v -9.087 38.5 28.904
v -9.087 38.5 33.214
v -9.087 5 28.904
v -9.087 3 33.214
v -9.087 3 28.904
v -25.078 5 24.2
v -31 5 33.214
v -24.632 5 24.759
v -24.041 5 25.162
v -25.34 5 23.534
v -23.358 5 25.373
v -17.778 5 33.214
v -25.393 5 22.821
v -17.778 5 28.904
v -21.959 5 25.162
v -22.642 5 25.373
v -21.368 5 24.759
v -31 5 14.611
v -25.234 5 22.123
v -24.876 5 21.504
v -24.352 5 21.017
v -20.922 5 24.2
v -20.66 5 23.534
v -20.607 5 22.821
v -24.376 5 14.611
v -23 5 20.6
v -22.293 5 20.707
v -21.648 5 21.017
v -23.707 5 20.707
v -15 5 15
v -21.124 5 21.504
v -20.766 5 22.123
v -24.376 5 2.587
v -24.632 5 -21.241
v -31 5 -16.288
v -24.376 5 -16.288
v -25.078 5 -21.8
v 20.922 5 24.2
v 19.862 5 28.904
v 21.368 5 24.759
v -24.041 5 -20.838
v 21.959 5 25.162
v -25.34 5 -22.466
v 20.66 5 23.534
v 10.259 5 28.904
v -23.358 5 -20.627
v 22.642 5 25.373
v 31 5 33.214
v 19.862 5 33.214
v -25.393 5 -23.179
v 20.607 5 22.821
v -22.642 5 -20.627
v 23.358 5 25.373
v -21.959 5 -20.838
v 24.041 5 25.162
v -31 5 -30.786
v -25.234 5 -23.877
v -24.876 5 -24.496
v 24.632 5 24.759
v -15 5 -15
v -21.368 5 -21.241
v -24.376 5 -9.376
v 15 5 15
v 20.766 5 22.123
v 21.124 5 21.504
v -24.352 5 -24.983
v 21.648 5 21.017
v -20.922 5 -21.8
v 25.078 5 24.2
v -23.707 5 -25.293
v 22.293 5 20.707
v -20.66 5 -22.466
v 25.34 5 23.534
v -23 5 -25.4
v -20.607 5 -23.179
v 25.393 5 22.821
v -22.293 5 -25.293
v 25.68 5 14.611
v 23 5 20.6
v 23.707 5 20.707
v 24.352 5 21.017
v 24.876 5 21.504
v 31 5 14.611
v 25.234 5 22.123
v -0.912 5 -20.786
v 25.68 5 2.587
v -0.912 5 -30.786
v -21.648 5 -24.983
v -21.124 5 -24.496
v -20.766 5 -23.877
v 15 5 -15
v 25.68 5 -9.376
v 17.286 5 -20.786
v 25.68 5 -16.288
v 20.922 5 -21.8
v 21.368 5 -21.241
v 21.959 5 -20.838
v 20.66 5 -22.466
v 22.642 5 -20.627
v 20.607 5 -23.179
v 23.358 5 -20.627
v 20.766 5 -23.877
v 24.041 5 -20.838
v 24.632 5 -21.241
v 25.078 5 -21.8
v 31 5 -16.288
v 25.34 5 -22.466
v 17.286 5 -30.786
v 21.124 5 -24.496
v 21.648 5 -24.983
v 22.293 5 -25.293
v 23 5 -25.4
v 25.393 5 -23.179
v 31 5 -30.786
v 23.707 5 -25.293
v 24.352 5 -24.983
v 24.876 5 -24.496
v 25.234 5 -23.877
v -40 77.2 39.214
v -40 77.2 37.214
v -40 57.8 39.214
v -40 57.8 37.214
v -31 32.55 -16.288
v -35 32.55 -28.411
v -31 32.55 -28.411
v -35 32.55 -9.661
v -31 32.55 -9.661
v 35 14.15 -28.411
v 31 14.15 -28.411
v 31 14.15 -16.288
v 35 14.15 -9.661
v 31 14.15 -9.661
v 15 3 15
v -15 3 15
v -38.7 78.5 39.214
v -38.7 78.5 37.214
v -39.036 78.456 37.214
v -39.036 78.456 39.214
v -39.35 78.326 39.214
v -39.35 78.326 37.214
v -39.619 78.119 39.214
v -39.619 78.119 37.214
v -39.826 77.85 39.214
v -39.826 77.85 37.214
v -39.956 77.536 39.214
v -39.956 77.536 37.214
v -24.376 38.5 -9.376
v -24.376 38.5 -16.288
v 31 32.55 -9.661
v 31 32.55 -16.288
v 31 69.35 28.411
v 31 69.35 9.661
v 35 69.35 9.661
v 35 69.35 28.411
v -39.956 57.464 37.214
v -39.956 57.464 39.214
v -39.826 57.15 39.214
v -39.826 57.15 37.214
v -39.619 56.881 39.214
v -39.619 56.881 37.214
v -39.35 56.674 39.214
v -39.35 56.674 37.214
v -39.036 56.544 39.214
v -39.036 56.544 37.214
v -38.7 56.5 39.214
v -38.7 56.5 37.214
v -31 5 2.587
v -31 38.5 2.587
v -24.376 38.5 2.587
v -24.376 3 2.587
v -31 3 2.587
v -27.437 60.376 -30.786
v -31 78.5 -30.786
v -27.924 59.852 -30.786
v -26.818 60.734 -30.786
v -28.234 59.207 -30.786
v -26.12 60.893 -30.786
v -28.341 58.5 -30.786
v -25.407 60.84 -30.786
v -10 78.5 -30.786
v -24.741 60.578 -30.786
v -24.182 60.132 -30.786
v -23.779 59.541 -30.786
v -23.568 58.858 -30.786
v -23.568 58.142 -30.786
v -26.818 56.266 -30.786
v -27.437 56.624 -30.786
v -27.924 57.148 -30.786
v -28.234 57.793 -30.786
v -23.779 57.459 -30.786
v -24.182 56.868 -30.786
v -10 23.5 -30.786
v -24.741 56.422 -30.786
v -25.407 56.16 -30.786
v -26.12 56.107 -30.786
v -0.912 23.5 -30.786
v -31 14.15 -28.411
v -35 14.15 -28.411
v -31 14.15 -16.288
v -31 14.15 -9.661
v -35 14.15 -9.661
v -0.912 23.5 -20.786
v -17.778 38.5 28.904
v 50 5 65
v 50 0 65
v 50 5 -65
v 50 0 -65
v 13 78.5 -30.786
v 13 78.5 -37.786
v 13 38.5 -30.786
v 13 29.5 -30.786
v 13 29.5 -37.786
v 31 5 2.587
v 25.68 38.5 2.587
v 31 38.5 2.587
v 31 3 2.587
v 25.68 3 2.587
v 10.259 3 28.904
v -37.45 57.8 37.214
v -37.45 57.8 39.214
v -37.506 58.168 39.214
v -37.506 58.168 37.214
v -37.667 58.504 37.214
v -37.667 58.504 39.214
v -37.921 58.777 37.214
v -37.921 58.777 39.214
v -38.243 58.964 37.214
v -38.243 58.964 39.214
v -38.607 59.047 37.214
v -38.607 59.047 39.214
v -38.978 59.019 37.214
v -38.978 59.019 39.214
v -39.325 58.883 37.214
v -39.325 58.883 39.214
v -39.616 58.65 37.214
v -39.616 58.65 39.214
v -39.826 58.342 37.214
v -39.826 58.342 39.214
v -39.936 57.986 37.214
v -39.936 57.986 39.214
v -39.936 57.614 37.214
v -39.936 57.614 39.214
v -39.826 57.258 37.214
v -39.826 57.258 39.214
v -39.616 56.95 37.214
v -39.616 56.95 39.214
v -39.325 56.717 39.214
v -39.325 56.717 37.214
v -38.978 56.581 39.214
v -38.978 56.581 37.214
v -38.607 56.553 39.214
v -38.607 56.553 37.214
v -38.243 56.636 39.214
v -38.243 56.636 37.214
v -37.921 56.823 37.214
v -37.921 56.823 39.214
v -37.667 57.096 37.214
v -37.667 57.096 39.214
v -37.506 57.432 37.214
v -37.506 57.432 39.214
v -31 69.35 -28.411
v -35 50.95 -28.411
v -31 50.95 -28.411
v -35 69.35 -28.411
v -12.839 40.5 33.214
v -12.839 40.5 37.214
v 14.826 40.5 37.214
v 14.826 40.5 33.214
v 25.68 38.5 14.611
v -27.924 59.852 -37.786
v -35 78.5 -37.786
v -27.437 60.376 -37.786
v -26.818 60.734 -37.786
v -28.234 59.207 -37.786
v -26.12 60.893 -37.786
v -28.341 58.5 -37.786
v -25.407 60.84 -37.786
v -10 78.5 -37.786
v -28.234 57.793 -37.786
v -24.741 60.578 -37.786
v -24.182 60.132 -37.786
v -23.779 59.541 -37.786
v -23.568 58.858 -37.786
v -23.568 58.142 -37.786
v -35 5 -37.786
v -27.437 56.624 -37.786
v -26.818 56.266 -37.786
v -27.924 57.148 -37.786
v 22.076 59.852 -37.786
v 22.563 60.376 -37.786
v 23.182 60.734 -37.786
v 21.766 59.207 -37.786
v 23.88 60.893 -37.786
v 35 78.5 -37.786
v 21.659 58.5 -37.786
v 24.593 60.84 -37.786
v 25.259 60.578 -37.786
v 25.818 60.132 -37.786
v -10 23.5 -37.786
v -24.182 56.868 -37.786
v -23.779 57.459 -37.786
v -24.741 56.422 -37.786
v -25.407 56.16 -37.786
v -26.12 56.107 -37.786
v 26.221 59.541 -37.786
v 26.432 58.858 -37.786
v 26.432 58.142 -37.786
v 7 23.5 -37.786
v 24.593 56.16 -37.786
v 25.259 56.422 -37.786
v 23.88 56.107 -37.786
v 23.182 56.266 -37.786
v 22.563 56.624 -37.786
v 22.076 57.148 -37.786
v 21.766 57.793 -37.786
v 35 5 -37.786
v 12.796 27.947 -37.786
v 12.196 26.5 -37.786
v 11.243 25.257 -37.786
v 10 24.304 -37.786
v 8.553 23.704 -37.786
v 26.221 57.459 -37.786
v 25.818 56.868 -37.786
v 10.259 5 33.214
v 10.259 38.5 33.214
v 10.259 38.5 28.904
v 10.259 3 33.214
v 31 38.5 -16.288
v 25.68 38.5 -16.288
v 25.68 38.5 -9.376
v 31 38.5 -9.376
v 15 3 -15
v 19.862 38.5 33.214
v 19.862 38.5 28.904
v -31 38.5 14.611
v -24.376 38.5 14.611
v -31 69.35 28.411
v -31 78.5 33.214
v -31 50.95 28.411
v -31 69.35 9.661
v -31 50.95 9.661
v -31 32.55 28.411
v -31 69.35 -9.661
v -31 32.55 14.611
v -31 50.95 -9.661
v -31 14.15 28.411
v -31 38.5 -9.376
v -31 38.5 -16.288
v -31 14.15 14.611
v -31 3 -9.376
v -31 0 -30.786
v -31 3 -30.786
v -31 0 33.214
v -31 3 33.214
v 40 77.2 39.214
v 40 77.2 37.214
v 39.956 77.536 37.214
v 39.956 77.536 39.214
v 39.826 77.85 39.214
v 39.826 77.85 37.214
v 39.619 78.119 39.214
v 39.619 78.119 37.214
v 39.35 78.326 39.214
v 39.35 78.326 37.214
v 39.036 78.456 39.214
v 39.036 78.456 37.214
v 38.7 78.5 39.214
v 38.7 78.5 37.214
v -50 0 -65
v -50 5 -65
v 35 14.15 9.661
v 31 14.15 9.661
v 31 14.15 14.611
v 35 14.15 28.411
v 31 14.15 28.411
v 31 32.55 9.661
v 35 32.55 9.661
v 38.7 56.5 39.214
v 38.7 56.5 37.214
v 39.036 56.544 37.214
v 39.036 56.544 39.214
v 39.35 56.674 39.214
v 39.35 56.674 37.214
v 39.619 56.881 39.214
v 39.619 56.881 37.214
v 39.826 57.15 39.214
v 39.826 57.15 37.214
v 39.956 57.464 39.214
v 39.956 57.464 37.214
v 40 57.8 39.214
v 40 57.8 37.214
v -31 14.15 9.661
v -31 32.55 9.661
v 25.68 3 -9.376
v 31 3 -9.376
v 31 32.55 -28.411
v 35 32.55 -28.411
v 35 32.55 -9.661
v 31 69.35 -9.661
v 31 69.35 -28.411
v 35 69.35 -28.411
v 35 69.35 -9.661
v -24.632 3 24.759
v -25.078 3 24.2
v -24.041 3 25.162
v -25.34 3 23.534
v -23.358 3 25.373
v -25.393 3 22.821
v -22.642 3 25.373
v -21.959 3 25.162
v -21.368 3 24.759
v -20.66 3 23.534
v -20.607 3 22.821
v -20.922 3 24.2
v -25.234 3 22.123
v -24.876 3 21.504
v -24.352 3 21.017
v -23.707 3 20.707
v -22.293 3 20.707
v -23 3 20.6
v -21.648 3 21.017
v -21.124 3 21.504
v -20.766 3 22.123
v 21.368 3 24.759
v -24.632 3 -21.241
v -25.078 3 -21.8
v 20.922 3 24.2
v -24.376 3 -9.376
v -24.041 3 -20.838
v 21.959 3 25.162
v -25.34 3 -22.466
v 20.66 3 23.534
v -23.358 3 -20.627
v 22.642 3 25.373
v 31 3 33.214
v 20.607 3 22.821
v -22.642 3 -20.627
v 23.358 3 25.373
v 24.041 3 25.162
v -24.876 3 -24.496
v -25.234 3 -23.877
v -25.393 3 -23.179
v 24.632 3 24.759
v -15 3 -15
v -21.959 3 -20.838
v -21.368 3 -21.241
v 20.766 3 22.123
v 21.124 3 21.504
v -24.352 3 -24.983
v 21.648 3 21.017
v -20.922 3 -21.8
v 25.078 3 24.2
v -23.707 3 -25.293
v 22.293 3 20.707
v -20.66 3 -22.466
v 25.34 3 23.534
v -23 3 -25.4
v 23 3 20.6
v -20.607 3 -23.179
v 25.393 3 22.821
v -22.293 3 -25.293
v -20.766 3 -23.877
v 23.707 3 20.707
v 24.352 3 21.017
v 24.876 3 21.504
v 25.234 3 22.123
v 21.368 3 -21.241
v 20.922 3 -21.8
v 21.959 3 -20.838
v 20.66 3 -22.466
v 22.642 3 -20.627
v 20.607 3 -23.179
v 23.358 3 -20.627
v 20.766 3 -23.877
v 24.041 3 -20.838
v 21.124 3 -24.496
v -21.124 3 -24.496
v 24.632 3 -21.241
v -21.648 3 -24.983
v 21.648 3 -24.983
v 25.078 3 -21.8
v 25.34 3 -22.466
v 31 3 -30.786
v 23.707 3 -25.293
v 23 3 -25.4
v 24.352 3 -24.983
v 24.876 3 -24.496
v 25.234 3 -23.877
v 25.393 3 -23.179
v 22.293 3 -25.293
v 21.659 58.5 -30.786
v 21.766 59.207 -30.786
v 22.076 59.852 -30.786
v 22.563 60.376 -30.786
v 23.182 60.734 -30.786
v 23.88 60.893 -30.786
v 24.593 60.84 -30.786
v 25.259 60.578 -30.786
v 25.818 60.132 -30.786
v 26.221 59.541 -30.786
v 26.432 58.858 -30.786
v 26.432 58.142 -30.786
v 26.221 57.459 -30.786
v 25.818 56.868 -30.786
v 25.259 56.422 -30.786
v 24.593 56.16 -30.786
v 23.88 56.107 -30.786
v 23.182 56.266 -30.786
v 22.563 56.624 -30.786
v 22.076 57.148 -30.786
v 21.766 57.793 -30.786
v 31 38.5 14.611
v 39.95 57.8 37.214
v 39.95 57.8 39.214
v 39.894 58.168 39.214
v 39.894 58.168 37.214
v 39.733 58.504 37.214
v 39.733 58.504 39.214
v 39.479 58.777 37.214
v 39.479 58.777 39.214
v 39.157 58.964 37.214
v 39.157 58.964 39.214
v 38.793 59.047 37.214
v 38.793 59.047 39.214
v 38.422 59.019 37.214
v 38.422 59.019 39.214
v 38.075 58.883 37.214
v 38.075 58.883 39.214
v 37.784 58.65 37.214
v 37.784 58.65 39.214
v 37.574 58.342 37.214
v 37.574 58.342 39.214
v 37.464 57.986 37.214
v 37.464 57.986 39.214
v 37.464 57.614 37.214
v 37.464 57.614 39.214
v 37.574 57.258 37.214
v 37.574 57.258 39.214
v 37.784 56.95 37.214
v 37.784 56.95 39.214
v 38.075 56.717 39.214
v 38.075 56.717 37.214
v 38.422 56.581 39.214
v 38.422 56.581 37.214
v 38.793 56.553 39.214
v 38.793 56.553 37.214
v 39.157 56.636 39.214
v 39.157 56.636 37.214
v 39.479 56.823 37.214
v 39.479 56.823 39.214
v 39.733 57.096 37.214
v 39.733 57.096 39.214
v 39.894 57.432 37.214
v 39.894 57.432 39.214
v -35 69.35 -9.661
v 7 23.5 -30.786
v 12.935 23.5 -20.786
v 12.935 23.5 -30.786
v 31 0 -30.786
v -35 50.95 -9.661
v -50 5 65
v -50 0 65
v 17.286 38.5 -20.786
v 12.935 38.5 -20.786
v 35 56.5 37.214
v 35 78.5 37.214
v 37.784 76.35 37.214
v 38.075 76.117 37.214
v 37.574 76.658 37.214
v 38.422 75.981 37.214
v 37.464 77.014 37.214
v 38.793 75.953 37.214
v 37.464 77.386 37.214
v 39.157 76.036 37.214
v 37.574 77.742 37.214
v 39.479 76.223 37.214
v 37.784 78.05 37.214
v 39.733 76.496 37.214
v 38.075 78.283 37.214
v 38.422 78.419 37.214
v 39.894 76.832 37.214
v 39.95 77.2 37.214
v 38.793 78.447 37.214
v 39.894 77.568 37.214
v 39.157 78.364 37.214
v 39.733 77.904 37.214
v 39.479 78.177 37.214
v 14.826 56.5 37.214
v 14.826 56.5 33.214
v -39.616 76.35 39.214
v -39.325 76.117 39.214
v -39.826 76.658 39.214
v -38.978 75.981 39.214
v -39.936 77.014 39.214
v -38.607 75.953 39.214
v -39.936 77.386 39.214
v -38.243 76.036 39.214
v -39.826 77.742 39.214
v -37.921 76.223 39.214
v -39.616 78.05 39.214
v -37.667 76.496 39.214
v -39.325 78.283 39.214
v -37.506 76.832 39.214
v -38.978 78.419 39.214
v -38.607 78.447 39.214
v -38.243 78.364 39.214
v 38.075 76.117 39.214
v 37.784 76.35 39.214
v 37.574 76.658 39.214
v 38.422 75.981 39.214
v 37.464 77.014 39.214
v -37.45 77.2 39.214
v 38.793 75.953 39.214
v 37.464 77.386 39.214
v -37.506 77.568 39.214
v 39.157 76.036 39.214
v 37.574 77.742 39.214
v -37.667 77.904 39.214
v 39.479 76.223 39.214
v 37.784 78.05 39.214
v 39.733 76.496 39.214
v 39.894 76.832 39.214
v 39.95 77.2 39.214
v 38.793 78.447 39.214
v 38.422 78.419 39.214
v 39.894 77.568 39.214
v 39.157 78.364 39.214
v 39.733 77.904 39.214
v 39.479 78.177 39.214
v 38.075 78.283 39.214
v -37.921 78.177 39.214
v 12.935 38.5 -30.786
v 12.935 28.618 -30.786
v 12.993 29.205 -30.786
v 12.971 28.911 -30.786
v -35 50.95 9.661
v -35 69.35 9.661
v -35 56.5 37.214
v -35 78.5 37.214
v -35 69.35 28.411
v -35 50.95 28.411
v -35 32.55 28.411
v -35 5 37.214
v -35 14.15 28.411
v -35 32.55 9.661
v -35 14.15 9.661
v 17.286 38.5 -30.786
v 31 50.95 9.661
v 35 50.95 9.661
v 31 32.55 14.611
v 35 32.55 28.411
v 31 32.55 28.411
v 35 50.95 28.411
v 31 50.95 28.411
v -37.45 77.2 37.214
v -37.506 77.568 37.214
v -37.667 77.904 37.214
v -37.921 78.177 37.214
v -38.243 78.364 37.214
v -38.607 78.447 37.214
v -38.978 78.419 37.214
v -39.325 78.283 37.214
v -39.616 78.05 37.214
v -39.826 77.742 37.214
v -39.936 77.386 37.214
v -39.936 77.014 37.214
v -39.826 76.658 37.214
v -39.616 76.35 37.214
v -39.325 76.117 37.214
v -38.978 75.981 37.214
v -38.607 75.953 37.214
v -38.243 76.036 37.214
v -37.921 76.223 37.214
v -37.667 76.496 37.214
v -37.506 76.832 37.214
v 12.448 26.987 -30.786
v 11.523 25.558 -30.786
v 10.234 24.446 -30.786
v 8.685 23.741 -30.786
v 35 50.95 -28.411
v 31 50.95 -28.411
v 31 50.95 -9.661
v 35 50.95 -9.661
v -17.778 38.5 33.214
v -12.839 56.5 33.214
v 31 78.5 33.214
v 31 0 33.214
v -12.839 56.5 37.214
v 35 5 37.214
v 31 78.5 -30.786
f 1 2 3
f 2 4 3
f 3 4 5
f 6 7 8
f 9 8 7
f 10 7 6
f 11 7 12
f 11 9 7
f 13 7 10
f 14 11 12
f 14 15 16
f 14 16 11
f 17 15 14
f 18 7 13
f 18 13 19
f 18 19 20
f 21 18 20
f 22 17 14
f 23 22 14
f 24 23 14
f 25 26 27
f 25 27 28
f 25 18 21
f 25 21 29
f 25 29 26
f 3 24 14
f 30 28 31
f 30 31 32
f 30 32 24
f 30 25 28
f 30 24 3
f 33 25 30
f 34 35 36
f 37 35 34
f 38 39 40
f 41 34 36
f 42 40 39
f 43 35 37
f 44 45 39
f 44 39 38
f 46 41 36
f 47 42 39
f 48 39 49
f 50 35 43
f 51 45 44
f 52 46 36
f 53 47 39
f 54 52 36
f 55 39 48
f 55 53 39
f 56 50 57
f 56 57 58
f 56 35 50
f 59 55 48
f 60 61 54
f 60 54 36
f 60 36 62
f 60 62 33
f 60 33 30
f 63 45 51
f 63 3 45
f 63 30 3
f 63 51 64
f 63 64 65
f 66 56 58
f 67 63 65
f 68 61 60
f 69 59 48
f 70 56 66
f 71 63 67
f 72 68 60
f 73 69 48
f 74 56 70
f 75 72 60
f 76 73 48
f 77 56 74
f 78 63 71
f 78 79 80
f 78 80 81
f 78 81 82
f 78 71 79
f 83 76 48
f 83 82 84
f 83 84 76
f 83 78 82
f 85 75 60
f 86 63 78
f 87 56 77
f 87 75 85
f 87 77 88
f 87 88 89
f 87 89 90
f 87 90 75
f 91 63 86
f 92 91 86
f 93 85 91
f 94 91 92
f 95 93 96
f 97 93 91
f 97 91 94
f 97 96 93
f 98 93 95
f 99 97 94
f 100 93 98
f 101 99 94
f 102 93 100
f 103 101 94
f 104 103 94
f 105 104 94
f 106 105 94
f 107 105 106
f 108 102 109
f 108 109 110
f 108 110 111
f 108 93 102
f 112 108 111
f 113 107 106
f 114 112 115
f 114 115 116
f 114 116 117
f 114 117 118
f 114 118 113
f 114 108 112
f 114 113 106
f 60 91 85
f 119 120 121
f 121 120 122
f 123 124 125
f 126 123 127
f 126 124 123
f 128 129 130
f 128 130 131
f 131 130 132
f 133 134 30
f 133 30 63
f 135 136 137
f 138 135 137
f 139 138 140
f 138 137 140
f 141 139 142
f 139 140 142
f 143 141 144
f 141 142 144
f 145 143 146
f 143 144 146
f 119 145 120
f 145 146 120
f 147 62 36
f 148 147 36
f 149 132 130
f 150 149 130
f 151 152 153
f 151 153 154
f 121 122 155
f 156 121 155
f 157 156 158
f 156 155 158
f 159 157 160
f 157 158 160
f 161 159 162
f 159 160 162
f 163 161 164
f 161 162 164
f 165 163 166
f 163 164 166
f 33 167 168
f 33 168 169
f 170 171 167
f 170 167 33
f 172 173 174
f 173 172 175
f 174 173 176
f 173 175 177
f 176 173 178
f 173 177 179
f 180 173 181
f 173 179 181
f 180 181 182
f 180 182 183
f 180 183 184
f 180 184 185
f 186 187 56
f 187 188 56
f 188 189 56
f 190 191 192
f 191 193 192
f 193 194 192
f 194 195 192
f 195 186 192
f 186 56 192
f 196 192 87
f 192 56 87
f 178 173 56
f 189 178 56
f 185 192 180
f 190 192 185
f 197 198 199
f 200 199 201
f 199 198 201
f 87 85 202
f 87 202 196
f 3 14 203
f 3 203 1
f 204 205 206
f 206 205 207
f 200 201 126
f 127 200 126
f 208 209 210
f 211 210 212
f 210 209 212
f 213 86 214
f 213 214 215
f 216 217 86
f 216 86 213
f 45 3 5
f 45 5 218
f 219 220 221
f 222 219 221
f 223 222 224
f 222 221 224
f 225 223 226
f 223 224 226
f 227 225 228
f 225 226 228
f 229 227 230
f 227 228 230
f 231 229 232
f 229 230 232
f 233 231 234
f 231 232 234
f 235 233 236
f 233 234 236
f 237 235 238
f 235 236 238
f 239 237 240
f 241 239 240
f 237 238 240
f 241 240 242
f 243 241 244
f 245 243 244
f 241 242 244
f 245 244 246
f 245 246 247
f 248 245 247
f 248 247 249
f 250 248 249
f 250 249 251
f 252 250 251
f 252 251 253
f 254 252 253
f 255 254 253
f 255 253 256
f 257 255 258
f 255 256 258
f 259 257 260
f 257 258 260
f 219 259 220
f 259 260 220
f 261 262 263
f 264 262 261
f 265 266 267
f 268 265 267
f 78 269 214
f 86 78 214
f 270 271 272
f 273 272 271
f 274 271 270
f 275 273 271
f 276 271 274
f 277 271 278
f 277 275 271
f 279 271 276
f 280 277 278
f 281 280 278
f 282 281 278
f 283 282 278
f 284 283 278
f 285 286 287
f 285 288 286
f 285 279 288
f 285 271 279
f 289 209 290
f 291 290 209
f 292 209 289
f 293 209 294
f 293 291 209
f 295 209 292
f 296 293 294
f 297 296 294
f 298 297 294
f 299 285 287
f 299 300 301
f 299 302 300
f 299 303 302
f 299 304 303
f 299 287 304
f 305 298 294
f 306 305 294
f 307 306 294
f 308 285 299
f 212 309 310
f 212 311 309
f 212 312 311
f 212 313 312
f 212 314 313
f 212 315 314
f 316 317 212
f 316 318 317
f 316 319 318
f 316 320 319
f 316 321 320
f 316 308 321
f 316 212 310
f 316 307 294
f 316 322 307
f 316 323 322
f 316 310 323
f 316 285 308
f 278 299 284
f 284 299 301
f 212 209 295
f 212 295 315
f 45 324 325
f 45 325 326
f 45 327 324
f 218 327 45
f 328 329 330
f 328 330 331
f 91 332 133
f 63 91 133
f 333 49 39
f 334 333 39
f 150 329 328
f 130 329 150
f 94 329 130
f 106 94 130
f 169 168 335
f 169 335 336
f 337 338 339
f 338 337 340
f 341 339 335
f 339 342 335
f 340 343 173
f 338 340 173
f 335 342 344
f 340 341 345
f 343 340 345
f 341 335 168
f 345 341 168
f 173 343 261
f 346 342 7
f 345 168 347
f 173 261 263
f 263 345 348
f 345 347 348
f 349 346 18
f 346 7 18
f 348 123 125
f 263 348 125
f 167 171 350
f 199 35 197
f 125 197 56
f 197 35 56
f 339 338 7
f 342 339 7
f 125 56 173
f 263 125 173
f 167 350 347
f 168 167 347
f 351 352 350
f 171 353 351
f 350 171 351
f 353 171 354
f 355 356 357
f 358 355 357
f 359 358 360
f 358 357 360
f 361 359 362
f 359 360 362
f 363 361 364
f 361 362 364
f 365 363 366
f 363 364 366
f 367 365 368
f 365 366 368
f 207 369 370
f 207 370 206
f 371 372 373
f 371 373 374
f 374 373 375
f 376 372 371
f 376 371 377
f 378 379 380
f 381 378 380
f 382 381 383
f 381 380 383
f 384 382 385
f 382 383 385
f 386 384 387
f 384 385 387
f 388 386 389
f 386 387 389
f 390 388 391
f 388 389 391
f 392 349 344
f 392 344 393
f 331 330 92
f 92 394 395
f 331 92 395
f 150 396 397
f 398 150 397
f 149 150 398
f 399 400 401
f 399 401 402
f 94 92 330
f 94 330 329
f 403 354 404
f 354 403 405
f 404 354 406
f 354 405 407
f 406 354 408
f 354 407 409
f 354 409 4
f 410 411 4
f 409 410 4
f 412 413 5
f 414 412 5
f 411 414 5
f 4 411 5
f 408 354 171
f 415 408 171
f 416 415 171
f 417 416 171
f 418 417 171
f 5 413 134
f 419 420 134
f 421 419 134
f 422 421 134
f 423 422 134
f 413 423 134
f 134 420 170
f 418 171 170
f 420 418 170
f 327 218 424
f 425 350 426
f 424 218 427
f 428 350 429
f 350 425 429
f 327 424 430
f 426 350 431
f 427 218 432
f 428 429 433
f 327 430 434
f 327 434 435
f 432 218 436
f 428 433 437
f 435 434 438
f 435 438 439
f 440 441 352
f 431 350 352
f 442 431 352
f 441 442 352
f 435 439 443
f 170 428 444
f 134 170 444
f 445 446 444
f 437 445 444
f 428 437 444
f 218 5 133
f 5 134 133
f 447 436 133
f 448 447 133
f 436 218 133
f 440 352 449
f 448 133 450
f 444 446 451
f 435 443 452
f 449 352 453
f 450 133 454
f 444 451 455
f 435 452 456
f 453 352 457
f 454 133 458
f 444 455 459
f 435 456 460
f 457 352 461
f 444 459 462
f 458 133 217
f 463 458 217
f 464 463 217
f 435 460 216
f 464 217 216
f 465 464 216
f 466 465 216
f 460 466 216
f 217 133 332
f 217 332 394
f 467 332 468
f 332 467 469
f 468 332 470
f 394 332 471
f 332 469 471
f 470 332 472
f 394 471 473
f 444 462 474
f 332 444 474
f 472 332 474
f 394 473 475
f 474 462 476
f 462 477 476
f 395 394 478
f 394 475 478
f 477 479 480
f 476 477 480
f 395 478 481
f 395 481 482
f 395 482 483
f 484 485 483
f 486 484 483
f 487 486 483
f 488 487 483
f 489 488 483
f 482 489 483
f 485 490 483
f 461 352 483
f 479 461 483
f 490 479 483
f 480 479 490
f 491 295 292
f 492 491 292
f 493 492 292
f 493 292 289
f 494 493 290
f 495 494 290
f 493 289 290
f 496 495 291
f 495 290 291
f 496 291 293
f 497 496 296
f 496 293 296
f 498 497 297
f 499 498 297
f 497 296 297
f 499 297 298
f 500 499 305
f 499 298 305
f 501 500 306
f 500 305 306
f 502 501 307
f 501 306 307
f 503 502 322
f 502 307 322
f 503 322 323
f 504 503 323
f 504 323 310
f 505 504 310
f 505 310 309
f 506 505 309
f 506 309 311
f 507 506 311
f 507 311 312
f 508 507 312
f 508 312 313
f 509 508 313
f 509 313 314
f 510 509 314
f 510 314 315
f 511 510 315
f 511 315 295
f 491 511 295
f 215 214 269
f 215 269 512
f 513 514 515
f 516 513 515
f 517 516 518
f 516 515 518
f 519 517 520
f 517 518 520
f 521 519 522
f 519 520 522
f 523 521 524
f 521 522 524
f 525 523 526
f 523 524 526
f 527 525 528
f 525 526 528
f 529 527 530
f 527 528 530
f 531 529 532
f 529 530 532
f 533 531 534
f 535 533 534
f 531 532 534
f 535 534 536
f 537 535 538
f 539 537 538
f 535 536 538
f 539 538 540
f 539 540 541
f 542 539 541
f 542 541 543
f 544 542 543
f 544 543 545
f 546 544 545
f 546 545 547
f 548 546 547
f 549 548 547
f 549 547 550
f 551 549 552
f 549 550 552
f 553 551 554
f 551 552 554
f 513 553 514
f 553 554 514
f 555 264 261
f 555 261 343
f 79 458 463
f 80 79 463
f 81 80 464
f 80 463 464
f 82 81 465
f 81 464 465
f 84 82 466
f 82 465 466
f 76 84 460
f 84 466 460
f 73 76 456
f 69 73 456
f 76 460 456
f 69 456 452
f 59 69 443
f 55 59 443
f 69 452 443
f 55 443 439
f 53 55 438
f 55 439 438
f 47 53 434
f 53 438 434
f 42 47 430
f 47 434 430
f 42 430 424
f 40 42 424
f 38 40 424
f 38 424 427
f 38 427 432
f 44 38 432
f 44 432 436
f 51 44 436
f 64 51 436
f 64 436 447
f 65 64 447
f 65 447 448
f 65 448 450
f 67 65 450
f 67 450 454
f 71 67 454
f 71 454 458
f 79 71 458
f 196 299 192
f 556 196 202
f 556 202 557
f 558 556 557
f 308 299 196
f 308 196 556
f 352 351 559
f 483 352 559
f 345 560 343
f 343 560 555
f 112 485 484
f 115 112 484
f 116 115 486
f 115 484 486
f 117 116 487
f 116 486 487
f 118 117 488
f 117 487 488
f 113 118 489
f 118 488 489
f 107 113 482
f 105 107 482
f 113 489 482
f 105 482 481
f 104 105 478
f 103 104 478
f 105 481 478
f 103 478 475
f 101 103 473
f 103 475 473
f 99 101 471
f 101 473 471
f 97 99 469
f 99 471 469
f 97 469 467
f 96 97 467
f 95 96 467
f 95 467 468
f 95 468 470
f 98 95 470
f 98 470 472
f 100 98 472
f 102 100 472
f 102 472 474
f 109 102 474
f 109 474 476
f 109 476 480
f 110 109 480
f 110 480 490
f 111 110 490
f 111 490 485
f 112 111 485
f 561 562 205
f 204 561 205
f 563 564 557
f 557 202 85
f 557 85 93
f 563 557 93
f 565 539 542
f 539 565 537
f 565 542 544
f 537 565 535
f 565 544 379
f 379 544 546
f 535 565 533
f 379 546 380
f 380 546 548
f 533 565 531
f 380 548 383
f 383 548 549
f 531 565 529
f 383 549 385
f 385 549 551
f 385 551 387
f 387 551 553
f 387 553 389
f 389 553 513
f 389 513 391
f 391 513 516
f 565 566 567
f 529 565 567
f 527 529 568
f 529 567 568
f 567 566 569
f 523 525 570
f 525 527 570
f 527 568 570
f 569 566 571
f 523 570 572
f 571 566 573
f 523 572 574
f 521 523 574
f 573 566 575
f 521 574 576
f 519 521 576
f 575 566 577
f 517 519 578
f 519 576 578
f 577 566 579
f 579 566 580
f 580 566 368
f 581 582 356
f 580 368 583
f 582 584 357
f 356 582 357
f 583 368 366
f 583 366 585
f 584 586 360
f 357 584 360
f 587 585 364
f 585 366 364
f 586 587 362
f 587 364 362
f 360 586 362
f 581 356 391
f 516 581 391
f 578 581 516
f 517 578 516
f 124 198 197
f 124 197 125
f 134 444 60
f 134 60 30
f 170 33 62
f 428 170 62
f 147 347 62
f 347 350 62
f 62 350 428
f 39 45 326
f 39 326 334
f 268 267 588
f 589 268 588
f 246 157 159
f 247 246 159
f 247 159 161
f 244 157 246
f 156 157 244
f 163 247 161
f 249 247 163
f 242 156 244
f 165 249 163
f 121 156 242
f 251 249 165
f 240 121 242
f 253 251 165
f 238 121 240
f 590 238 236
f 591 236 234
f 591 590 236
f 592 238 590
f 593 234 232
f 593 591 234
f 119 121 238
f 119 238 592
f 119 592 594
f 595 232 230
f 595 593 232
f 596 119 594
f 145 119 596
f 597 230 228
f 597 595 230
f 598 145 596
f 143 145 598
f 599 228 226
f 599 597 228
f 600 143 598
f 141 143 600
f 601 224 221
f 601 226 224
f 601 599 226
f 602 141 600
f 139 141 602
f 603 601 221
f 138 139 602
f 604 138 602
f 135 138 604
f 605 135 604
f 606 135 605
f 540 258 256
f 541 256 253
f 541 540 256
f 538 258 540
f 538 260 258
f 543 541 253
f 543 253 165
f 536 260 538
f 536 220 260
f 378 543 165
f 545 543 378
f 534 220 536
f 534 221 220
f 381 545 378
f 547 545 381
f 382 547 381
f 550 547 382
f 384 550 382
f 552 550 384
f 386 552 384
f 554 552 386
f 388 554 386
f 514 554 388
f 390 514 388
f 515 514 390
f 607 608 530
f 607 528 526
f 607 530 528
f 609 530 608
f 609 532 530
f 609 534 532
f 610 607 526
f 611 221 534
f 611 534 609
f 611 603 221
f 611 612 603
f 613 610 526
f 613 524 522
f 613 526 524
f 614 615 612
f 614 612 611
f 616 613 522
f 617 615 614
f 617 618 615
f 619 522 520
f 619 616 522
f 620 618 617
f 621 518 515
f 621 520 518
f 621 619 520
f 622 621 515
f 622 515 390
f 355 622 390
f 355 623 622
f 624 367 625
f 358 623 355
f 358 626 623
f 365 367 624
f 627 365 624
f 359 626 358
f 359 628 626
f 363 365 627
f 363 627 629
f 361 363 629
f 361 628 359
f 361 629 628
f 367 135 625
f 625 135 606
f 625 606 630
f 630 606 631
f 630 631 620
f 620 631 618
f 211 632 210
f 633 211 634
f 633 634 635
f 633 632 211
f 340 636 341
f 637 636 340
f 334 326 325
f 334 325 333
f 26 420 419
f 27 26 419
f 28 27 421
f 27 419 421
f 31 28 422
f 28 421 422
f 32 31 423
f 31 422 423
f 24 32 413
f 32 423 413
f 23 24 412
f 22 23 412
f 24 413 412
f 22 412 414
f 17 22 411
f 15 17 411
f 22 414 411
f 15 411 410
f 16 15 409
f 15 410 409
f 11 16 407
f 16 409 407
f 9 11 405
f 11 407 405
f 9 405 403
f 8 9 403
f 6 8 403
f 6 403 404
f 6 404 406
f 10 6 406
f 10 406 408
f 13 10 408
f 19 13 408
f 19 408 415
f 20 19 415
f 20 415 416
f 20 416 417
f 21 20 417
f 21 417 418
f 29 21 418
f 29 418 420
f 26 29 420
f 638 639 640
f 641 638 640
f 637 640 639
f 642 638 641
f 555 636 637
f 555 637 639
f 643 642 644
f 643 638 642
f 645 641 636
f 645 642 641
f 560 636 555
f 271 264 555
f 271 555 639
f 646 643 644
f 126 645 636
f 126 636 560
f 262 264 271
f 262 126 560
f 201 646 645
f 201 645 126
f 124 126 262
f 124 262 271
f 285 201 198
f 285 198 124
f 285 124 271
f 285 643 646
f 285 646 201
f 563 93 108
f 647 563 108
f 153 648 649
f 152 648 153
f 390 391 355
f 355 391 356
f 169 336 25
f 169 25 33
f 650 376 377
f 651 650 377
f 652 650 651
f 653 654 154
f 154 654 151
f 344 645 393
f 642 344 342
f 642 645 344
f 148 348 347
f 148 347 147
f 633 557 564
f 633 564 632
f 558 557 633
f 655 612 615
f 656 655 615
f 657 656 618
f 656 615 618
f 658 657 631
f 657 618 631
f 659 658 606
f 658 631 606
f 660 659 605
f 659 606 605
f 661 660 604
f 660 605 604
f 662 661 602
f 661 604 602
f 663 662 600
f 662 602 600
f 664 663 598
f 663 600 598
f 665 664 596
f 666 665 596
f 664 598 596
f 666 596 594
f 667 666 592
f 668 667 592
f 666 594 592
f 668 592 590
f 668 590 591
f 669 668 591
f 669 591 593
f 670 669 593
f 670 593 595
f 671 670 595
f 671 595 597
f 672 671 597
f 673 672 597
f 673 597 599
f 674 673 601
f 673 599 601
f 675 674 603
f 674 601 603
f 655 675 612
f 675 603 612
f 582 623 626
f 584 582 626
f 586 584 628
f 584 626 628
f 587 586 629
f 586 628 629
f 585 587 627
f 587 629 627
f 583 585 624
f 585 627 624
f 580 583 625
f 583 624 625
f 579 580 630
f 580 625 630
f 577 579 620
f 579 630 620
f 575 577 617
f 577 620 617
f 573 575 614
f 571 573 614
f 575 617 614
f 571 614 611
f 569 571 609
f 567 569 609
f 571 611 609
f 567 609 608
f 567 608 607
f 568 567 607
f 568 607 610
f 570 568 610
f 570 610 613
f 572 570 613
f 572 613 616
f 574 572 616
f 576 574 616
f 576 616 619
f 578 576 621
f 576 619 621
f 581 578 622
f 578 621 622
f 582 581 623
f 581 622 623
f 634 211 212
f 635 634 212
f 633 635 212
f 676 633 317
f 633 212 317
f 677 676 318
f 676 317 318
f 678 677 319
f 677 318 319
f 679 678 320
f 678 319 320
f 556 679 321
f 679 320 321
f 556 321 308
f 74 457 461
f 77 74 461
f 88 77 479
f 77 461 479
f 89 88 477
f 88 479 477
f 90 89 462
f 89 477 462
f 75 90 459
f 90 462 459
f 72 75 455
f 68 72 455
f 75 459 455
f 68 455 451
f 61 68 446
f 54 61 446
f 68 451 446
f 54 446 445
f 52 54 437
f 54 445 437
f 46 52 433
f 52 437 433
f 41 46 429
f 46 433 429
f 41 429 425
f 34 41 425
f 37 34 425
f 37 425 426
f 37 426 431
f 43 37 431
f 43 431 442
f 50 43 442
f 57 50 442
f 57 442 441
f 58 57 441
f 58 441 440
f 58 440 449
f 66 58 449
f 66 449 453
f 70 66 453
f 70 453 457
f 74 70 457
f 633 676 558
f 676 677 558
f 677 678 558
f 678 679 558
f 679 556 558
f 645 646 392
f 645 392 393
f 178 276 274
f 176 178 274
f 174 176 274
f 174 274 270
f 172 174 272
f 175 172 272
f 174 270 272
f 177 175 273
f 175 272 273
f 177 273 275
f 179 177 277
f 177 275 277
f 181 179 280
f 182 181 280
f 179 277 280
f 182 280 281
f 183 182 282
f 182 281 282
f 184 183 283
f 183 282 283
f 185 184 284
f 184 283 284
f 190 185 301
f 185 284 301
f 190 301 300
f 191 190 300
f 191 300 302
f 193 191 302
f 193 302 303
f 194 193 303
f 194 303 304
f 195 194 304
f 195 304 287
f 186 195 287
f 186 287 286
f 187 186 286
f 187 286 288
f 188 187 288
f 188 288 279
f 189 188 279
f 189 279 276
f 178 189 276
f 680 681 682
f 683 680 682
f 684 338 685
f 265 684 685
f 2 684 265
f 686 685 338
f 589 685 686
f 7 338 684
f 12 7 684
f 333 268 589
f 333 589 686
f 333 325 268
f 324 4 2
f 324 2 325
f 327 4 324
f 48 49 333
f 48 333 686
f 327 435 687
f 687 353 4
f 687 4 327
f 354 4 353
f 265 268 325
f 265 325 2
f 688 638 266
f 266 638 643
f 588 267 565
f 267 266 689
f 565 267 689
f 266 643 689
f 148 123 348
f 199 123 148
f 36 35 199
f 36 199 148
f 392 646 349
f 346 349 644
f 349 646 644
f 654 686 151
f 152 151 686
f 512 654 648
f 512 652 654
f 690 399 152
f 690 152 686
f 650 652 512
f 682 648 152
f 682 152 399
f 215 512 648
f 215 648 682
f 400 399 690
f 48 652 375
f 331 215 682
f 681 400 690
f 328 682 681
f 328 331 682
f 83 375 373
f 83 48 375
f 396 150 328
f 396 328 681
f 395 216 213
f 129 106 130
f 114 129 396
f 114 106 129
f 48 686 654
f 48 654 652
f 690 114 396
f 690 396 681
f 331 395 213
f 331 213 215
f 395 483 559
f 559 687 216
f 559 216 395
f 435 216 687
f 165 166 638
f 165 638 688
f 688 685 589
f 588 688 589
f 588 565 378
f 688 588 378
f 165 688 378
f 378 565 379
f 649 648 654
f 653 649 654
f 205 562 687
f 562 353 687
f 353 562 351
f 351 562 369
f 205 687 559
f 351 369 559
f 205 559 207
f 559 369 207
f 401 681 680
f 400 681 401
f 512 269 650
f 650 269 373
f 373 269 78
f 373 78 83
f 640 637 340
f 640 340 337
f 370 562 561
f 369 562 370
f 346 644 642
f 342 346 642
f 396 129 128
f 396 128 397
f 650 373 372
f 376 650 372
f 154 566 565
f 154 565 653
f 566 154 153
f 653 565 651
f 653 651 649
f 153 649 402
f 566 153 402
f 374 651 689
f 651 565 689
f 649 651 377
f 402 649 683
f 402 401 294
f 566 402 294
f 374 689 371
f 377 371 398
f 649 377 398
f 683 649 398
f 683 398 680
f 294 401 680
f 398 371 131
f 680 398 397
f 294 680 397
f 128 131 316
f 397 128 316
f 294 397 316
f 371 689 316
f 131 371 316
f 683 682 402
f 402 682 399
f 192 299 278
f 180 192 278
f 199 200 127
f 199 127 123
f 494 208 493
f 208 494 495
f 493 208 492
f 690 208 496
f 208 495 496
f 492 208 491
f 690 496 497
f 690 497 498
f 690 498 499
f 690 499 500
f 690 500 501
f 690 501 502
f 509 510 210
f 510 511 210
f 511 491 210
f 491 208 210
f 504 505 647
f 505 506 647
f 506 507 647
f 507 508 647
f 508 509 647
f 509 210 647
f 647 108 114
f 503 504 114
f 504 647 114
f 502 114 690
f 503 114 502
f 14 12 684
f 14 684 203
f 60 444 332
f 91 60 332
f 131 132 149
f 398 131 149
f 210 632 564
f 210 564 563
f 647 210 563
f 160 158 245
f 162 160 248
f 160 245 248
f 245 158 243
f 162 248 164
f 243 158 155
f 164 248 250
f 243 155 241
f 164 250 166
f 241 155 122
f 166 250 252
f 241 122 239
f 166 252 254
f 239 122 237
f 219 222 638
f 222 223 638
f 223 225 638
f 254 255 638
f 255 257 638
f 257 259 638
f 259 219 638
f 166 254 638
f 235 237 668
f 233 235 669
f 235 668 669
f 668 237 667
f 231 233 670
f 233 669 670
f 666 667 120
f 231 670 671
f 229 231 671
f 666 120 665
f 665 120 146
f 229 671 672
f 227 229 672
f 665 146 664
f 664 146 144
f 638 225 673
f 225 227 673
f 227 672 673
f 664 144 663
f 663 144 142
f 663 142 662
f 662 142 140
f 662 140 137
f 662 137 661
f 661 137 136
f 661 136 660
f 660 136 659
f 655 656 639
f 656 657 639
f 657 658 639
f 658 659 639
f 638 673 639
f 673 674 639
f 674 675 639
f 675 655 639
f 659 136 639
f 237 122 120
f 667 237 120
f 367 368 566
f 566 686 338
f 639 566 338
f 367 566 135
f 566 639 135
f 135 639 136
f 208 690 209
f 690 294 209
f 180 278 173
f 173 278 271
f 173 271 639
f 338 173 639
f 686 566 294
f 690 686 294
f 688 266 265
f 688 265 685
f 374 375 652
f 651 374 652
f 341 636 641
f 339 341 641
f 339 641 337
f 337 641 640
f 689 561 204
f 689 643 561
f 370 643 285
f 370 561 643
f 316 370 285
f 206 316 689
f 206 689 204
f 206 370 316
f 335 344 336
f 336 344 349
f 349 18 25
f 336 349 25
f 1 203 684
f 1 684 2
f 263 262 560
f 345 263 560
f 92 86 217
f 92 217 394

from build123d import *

# Parameters (mm, degrees)
SKETCH_1_W           = 100
SKETCH_1_H           = 130
EXTRUDE_1_DEPTH      = 5
SKETCH_2_W           = 70
SKETCH_2_H           = 75
SKETCH_2_W_2         = 62
SKETCH_2_H_2         = 64
EXTRUDE_2_DEPTH      = 73.5
SKETCH_3_W           = 18.75
SKETCH_3_H           = 18.4
CUT_EXTRUDE_1_DEPTH  = 133.711152508
CUT_EXTRUDE_2_DEPTH  = 10
SKETCH_7_W           = 62
SKETCH_7_H           = 64
CUT_EXTRUDE_3_DEPTH  = 3
SKETCH_8_W           = 30
SKETCH_8_H           = 30
CUT_EXTRUDE_4_DEPTH  = 3
SKETCH_9_R           = 2.4
CUT_EXTRUDE_5_DEPTH  = 112.468605446
SKETCH_11_W          = 14.189150171
SKETCH_11_H          = 10
EXTRUDE_3_DEPTH      = 18.5
SKETCH_12_W          = 4.351362518
SKETCH_12_H          = 10
EXTRUDE_4_DEPTH      = 33.5
SKETCH_13_W          = 6.623564314
SKETCH_13_H          = 6.911719061
SKETCH_13_H_2        = 12.024680345
SKETCH_13_W_2        = 5.320058298
SKETCH_13_W_3        = 8.691671684
SKETCH_13_H_3        = 4.310174588
SKETCH_13_W_4        = 9.602895329
EXTRUDE_5_DEPTH      = 33.5
SKETCH_14_R          = 2.4
CUT_EXTRUDE_6_DEPTH  = 40
EXTRUDE_8_DEPTH      = 2
SKETCH_21_R          = 1.25
CUT_EXTRUDE_9_DEPTH  = 2
SKETCH_22_W          = 27.664468573
SKETCH_22_H          = 16
CUT_EXTRUDE_10_DEPTH = 5
SKETCH_23_W          = 6.623564314
SKETCH_23_H          = 11.962590683
SKETCH_23_W_2        = 19.34597891
SKETCH_23_H_2        = 4.310174588
SKETCH_23_W_3        = 5.320058298
CUT_EXTRUDE_11_DEPTH = 111.123793978


with BuildPart() as part:
    # 草图1 → 凸台-拉伸1 (new body)
    with BuildSketch(Plane(origin=(0, 0, 0), x_dir=(1, 0, 0), z_dir=(0, 1, 0))):
        Rectangle(SKETCH_1_W, SKETCH_1_H)
    extrude(amount=EXTRUDE_1_DEPTH)

    # 草图2 → 凸台-拉伸2 (add)
    with BuildSketch(Plane(origin=(0, 5, 0), x_dir=(1, 0, 0), z_dir=(0, 1, 0))):
        with Locations((0, 0.285714286)):
            Rectangle(SKETCH_2_W, SKETCH_2_H)
        with Locations((0, -1.214285714)):
            Rectangle(SKETCH_2_W_2, SKETCH_2_H_2, mode=Mode.SUBTRACT)
    extrude(amount=EXTRUDE_2_DEPTH)

    # 草图3 → 切除-拉伸1 (cut, through all)
    with BuildSketch(Plane.ZY.offset(35)):
        with Locations((-19.035714286, 60.15)):
            Rectangle(SKETCH_3_W, SKETCH_3_H)
        with Locations((19.035714286, 60.15)):
            Rectangle(SKETCH_3_W, SKETCH_3_H)
        with Locations((19.035714286, 23.35)):
            Rectangle(SKETCH_3_W, SKETCH_3_H)
        with Locations((-19.035714286, 23.35)):
            Rectangle(SKETCH_3_W, SKETCH_3_H)
    extrude(amount=-CUT_EXTRUDE_1_DEPTH, mode=Mode.SUBTRACT)

    # 草图4 → 切除-拉伸2 (cut)
    with BuildSketch(Plane(origin=(0, 0, -37.785714286), x_dir=(-1, 0, 0), z_dir=(0, 0, -1))):
        with BuildLine():
            Line((-13, 78.5), (-13, 35.5))
            Line((-13, 35.5), (-13, 29.5))
            ThreePointArc((-13, 29.5), (-11.242640687, 25.257359313), (-7, 23.5))
            Line((-7, 23.5), (10, 23.5))
            Line((10, 23.5), (10, 78.5))
            Line((10, 78.5), (-13, 78.5))
        make_face()
    extrude(amount=-CUT_EXTRUDE_2_DEPTH, mode=Mode.SUBTRACT)

    # 草图7 → 切除-拉伸3 (cut)
    with BuildSketch(Plane(origin=(0, 0, 0), x_dir=(1, 0, 0), z_dir=(0, 1, 0))):
        with Locations((0, -1.214285714)):
            Rectangle(SKETCH_7_W, SKETCH_7_H)
    extrude(amount=CUT_EXTRUDE_3_DEPTH, mode=Mode.SUBTRACT)

    # 草图8 → 切除-拉伸4 (cut)
    with BuildSketch(Plane.XZ.offset(-3)):
        Rectangle(SKETCH_8_W, SKETCH_8_H)
    extrude(amount=-CUT_EXTRUDE_4_DEPTH, mode=Mode.SUBTRACT)

    # 草图9 → 切除-拉伸5 (cut, through all)
    with BuildSketch(Plane.XZ.offset(-3)):
        with Locations(Location((-23, -23, 0), (0, 0, 270))):
            Circle(SKETCH_9_R)
        with Locations(Location((23, -23, 0), (0, 0, 270))):
            Circle(SKETCH_9_R)
        with Locations(Location((23, 23, 0), (0, 0, 270))):
            Circle(SKETCH_9_R)
        with Locations(Location((-23, 23, 0), (0, 0, 270))):
            Circle(SKETCH_9_R)
    extrude(amount=-CUT_EXTRUDE_5_DEPTH, mode=Mode.SUBTRACT)

    # 草图11 → 凸台-拉伸3 (add)
    with BuildSketch(Plane(origin=(0, 5, 0), x_dir=(1, 0, 0), z_dir=(0, 1, 0))):
        with Locations((6.182659264, 25.785714286)):
            Rectangle(SKETCH_11_W, SKETCH_11_H)
    extrude(amount=EXTRUDE_3_DEPTH)

    # 草图12 → 凸台-拉伸4 (add)
    with BuildSketch(Plane(origin=(0, 5, 0), x_dir=(1, 0, 0), z_dir=(0, 1, 0))):
        with Locations((15.110555439, 25.785714286)):
            Rectangle(SKETCH_12_W, SKETCH_12_H)
    extrude(amount=EXTRUDE_4_DEPTH)

    # 草图13 → 凸台-拉伸5 (add)
    with BuildSketch(Plane(origin=(0, 5, 0), x_dir=(1, 0, 0), z_dir=(0, 1, 0))):
        with Locations((-27.688217843, 12.831804422)):
            Rectangle(SKETCH_13_W, SKETCH_13_H)
        with Locations((-27.688217843, -8.598985965)):
            Rectangle(SKETCH_13_W, SKETCH_13_H_2)
        with Locations((28.339970851, 12.831804422)):
            Rectangle(SKETCH_13_W_2, SKETCH_13_H)
        with Locations((28.339970851, -8.598985965)):
            Rectangle(SKETCH_13_W_2, SKETCH_13_H_2)
        with Locations((-13.432580878, -31.05919842)):
            Rectangle(SKETCH_13_W_3, SKETCH_13_H_3)
        with Locations((15.060681539, -31.05919842)):
            Rectangle(SKETCH_13_W_4, SKETCH_13_H_3)
    extrude(amount=EXTRUDE_5_DEPTH)

    # 草图14 → 切除-拉伸6 (cut)
    with BuildSketch(Plane(origin=(0, 0, -37.785714286), x_dir=(-1, 0, 0), z_dir=(0, 0, -1))):
        with Locations((-24.05892938, 58.5)):
            Circle(SKETCH_14_R)
        with Locations((25.94107062, 58.5)):
            Circle(SKETCH_14_R)
    extrude(amount=-CUT_EXTRUDE_6_DEPTH, mode=Mode.SUBTRACT)

    # 草图20 → 凸台-拉伸8 (add)
    with BuildSketch(Plane.XY.offset(37.214285714)):
        with BuildLine():
            Line((-38.7, 56.5), (38.7, 56.5))
            ThreePointArc((38.7, 56.5), (39.619238816, 56.880761184), (40, 57.8))
            Line((40, 57.8), (40, 77.2))
            ThreePointArc((40, 77.2), (39.619238816, 78.119238816), (38.7, 78.5))
            Line((38.7, 78.5), (-38.7, 78.5))
            ThreePointArc((-38.7, 78.5), (-39.619238816, 78.119238816), (-40, 77.2))
            Line((-40, 77.2), (-40, 57.8))
            ThreePointArc((-40, 57.8), (-39.619238816, 56.880761184), (-38.7, 56.5))
        make_face()
    extrude(amount=EXTRUDE_8_DEPTH)

    # 草图21 → 切除-拉伸9 (cut)
    with BuildSketch(Plane.XY.offset(39.214285714)):
        with Locations((-38.7, 77.2)):
            Circle(SKETCH_21_R)
        with Locations((-38.7, 57.8)):
            Circle(SKETCH_21_R)
        with Locations((38.7, 77.2)):
            Circle(SKETCH_21_R)
        with Locations((38.7, 57.8)):
            Circle(SKETCH_21_R)
    extrude(amount=-CUT_EXTRUDE_9_DEPTH, mode=Mode.SUBTRACT)

    # 草图22 → 切除-拉伸10 (cut)
    with BuildSketch(Plane.XY.offset(37.214285714)):
        with Locations((0.99347539, 48.5)):
            Rectangle(SKETCH_22_W, SKETCH_22_H)
    extrude(amount=-CUT_EXTRUDE_10_DEPTH, mode=Mode.SUBTRACT)

    # 草图23 → 切除-拉伸11 (cut, through all)
    with BuildSketch(Plane(origin=(0, 5, 0), x_dir=(1, 0, 0), z_dir=(0, 1, 0))):
        with Locations((-27.688217843, 3.39464955)):
            Rectangle(SKETCH_23_W, SKETCH_23_H)
        with Locations((0.586244419, -31.05919842)):
            Rectangle(SKETCH_23_W_2, SKETCH_23_H_2)
        with Locations((28.339970851, 3.39464955)):
            Rectangle(SKETCH_23_W_3, SKETCH_23_H)
    extrude(amount=-CUT_EXTRUDE_11_DEPTH, mode=Mode.SUBTRACT)


solid = part.part
